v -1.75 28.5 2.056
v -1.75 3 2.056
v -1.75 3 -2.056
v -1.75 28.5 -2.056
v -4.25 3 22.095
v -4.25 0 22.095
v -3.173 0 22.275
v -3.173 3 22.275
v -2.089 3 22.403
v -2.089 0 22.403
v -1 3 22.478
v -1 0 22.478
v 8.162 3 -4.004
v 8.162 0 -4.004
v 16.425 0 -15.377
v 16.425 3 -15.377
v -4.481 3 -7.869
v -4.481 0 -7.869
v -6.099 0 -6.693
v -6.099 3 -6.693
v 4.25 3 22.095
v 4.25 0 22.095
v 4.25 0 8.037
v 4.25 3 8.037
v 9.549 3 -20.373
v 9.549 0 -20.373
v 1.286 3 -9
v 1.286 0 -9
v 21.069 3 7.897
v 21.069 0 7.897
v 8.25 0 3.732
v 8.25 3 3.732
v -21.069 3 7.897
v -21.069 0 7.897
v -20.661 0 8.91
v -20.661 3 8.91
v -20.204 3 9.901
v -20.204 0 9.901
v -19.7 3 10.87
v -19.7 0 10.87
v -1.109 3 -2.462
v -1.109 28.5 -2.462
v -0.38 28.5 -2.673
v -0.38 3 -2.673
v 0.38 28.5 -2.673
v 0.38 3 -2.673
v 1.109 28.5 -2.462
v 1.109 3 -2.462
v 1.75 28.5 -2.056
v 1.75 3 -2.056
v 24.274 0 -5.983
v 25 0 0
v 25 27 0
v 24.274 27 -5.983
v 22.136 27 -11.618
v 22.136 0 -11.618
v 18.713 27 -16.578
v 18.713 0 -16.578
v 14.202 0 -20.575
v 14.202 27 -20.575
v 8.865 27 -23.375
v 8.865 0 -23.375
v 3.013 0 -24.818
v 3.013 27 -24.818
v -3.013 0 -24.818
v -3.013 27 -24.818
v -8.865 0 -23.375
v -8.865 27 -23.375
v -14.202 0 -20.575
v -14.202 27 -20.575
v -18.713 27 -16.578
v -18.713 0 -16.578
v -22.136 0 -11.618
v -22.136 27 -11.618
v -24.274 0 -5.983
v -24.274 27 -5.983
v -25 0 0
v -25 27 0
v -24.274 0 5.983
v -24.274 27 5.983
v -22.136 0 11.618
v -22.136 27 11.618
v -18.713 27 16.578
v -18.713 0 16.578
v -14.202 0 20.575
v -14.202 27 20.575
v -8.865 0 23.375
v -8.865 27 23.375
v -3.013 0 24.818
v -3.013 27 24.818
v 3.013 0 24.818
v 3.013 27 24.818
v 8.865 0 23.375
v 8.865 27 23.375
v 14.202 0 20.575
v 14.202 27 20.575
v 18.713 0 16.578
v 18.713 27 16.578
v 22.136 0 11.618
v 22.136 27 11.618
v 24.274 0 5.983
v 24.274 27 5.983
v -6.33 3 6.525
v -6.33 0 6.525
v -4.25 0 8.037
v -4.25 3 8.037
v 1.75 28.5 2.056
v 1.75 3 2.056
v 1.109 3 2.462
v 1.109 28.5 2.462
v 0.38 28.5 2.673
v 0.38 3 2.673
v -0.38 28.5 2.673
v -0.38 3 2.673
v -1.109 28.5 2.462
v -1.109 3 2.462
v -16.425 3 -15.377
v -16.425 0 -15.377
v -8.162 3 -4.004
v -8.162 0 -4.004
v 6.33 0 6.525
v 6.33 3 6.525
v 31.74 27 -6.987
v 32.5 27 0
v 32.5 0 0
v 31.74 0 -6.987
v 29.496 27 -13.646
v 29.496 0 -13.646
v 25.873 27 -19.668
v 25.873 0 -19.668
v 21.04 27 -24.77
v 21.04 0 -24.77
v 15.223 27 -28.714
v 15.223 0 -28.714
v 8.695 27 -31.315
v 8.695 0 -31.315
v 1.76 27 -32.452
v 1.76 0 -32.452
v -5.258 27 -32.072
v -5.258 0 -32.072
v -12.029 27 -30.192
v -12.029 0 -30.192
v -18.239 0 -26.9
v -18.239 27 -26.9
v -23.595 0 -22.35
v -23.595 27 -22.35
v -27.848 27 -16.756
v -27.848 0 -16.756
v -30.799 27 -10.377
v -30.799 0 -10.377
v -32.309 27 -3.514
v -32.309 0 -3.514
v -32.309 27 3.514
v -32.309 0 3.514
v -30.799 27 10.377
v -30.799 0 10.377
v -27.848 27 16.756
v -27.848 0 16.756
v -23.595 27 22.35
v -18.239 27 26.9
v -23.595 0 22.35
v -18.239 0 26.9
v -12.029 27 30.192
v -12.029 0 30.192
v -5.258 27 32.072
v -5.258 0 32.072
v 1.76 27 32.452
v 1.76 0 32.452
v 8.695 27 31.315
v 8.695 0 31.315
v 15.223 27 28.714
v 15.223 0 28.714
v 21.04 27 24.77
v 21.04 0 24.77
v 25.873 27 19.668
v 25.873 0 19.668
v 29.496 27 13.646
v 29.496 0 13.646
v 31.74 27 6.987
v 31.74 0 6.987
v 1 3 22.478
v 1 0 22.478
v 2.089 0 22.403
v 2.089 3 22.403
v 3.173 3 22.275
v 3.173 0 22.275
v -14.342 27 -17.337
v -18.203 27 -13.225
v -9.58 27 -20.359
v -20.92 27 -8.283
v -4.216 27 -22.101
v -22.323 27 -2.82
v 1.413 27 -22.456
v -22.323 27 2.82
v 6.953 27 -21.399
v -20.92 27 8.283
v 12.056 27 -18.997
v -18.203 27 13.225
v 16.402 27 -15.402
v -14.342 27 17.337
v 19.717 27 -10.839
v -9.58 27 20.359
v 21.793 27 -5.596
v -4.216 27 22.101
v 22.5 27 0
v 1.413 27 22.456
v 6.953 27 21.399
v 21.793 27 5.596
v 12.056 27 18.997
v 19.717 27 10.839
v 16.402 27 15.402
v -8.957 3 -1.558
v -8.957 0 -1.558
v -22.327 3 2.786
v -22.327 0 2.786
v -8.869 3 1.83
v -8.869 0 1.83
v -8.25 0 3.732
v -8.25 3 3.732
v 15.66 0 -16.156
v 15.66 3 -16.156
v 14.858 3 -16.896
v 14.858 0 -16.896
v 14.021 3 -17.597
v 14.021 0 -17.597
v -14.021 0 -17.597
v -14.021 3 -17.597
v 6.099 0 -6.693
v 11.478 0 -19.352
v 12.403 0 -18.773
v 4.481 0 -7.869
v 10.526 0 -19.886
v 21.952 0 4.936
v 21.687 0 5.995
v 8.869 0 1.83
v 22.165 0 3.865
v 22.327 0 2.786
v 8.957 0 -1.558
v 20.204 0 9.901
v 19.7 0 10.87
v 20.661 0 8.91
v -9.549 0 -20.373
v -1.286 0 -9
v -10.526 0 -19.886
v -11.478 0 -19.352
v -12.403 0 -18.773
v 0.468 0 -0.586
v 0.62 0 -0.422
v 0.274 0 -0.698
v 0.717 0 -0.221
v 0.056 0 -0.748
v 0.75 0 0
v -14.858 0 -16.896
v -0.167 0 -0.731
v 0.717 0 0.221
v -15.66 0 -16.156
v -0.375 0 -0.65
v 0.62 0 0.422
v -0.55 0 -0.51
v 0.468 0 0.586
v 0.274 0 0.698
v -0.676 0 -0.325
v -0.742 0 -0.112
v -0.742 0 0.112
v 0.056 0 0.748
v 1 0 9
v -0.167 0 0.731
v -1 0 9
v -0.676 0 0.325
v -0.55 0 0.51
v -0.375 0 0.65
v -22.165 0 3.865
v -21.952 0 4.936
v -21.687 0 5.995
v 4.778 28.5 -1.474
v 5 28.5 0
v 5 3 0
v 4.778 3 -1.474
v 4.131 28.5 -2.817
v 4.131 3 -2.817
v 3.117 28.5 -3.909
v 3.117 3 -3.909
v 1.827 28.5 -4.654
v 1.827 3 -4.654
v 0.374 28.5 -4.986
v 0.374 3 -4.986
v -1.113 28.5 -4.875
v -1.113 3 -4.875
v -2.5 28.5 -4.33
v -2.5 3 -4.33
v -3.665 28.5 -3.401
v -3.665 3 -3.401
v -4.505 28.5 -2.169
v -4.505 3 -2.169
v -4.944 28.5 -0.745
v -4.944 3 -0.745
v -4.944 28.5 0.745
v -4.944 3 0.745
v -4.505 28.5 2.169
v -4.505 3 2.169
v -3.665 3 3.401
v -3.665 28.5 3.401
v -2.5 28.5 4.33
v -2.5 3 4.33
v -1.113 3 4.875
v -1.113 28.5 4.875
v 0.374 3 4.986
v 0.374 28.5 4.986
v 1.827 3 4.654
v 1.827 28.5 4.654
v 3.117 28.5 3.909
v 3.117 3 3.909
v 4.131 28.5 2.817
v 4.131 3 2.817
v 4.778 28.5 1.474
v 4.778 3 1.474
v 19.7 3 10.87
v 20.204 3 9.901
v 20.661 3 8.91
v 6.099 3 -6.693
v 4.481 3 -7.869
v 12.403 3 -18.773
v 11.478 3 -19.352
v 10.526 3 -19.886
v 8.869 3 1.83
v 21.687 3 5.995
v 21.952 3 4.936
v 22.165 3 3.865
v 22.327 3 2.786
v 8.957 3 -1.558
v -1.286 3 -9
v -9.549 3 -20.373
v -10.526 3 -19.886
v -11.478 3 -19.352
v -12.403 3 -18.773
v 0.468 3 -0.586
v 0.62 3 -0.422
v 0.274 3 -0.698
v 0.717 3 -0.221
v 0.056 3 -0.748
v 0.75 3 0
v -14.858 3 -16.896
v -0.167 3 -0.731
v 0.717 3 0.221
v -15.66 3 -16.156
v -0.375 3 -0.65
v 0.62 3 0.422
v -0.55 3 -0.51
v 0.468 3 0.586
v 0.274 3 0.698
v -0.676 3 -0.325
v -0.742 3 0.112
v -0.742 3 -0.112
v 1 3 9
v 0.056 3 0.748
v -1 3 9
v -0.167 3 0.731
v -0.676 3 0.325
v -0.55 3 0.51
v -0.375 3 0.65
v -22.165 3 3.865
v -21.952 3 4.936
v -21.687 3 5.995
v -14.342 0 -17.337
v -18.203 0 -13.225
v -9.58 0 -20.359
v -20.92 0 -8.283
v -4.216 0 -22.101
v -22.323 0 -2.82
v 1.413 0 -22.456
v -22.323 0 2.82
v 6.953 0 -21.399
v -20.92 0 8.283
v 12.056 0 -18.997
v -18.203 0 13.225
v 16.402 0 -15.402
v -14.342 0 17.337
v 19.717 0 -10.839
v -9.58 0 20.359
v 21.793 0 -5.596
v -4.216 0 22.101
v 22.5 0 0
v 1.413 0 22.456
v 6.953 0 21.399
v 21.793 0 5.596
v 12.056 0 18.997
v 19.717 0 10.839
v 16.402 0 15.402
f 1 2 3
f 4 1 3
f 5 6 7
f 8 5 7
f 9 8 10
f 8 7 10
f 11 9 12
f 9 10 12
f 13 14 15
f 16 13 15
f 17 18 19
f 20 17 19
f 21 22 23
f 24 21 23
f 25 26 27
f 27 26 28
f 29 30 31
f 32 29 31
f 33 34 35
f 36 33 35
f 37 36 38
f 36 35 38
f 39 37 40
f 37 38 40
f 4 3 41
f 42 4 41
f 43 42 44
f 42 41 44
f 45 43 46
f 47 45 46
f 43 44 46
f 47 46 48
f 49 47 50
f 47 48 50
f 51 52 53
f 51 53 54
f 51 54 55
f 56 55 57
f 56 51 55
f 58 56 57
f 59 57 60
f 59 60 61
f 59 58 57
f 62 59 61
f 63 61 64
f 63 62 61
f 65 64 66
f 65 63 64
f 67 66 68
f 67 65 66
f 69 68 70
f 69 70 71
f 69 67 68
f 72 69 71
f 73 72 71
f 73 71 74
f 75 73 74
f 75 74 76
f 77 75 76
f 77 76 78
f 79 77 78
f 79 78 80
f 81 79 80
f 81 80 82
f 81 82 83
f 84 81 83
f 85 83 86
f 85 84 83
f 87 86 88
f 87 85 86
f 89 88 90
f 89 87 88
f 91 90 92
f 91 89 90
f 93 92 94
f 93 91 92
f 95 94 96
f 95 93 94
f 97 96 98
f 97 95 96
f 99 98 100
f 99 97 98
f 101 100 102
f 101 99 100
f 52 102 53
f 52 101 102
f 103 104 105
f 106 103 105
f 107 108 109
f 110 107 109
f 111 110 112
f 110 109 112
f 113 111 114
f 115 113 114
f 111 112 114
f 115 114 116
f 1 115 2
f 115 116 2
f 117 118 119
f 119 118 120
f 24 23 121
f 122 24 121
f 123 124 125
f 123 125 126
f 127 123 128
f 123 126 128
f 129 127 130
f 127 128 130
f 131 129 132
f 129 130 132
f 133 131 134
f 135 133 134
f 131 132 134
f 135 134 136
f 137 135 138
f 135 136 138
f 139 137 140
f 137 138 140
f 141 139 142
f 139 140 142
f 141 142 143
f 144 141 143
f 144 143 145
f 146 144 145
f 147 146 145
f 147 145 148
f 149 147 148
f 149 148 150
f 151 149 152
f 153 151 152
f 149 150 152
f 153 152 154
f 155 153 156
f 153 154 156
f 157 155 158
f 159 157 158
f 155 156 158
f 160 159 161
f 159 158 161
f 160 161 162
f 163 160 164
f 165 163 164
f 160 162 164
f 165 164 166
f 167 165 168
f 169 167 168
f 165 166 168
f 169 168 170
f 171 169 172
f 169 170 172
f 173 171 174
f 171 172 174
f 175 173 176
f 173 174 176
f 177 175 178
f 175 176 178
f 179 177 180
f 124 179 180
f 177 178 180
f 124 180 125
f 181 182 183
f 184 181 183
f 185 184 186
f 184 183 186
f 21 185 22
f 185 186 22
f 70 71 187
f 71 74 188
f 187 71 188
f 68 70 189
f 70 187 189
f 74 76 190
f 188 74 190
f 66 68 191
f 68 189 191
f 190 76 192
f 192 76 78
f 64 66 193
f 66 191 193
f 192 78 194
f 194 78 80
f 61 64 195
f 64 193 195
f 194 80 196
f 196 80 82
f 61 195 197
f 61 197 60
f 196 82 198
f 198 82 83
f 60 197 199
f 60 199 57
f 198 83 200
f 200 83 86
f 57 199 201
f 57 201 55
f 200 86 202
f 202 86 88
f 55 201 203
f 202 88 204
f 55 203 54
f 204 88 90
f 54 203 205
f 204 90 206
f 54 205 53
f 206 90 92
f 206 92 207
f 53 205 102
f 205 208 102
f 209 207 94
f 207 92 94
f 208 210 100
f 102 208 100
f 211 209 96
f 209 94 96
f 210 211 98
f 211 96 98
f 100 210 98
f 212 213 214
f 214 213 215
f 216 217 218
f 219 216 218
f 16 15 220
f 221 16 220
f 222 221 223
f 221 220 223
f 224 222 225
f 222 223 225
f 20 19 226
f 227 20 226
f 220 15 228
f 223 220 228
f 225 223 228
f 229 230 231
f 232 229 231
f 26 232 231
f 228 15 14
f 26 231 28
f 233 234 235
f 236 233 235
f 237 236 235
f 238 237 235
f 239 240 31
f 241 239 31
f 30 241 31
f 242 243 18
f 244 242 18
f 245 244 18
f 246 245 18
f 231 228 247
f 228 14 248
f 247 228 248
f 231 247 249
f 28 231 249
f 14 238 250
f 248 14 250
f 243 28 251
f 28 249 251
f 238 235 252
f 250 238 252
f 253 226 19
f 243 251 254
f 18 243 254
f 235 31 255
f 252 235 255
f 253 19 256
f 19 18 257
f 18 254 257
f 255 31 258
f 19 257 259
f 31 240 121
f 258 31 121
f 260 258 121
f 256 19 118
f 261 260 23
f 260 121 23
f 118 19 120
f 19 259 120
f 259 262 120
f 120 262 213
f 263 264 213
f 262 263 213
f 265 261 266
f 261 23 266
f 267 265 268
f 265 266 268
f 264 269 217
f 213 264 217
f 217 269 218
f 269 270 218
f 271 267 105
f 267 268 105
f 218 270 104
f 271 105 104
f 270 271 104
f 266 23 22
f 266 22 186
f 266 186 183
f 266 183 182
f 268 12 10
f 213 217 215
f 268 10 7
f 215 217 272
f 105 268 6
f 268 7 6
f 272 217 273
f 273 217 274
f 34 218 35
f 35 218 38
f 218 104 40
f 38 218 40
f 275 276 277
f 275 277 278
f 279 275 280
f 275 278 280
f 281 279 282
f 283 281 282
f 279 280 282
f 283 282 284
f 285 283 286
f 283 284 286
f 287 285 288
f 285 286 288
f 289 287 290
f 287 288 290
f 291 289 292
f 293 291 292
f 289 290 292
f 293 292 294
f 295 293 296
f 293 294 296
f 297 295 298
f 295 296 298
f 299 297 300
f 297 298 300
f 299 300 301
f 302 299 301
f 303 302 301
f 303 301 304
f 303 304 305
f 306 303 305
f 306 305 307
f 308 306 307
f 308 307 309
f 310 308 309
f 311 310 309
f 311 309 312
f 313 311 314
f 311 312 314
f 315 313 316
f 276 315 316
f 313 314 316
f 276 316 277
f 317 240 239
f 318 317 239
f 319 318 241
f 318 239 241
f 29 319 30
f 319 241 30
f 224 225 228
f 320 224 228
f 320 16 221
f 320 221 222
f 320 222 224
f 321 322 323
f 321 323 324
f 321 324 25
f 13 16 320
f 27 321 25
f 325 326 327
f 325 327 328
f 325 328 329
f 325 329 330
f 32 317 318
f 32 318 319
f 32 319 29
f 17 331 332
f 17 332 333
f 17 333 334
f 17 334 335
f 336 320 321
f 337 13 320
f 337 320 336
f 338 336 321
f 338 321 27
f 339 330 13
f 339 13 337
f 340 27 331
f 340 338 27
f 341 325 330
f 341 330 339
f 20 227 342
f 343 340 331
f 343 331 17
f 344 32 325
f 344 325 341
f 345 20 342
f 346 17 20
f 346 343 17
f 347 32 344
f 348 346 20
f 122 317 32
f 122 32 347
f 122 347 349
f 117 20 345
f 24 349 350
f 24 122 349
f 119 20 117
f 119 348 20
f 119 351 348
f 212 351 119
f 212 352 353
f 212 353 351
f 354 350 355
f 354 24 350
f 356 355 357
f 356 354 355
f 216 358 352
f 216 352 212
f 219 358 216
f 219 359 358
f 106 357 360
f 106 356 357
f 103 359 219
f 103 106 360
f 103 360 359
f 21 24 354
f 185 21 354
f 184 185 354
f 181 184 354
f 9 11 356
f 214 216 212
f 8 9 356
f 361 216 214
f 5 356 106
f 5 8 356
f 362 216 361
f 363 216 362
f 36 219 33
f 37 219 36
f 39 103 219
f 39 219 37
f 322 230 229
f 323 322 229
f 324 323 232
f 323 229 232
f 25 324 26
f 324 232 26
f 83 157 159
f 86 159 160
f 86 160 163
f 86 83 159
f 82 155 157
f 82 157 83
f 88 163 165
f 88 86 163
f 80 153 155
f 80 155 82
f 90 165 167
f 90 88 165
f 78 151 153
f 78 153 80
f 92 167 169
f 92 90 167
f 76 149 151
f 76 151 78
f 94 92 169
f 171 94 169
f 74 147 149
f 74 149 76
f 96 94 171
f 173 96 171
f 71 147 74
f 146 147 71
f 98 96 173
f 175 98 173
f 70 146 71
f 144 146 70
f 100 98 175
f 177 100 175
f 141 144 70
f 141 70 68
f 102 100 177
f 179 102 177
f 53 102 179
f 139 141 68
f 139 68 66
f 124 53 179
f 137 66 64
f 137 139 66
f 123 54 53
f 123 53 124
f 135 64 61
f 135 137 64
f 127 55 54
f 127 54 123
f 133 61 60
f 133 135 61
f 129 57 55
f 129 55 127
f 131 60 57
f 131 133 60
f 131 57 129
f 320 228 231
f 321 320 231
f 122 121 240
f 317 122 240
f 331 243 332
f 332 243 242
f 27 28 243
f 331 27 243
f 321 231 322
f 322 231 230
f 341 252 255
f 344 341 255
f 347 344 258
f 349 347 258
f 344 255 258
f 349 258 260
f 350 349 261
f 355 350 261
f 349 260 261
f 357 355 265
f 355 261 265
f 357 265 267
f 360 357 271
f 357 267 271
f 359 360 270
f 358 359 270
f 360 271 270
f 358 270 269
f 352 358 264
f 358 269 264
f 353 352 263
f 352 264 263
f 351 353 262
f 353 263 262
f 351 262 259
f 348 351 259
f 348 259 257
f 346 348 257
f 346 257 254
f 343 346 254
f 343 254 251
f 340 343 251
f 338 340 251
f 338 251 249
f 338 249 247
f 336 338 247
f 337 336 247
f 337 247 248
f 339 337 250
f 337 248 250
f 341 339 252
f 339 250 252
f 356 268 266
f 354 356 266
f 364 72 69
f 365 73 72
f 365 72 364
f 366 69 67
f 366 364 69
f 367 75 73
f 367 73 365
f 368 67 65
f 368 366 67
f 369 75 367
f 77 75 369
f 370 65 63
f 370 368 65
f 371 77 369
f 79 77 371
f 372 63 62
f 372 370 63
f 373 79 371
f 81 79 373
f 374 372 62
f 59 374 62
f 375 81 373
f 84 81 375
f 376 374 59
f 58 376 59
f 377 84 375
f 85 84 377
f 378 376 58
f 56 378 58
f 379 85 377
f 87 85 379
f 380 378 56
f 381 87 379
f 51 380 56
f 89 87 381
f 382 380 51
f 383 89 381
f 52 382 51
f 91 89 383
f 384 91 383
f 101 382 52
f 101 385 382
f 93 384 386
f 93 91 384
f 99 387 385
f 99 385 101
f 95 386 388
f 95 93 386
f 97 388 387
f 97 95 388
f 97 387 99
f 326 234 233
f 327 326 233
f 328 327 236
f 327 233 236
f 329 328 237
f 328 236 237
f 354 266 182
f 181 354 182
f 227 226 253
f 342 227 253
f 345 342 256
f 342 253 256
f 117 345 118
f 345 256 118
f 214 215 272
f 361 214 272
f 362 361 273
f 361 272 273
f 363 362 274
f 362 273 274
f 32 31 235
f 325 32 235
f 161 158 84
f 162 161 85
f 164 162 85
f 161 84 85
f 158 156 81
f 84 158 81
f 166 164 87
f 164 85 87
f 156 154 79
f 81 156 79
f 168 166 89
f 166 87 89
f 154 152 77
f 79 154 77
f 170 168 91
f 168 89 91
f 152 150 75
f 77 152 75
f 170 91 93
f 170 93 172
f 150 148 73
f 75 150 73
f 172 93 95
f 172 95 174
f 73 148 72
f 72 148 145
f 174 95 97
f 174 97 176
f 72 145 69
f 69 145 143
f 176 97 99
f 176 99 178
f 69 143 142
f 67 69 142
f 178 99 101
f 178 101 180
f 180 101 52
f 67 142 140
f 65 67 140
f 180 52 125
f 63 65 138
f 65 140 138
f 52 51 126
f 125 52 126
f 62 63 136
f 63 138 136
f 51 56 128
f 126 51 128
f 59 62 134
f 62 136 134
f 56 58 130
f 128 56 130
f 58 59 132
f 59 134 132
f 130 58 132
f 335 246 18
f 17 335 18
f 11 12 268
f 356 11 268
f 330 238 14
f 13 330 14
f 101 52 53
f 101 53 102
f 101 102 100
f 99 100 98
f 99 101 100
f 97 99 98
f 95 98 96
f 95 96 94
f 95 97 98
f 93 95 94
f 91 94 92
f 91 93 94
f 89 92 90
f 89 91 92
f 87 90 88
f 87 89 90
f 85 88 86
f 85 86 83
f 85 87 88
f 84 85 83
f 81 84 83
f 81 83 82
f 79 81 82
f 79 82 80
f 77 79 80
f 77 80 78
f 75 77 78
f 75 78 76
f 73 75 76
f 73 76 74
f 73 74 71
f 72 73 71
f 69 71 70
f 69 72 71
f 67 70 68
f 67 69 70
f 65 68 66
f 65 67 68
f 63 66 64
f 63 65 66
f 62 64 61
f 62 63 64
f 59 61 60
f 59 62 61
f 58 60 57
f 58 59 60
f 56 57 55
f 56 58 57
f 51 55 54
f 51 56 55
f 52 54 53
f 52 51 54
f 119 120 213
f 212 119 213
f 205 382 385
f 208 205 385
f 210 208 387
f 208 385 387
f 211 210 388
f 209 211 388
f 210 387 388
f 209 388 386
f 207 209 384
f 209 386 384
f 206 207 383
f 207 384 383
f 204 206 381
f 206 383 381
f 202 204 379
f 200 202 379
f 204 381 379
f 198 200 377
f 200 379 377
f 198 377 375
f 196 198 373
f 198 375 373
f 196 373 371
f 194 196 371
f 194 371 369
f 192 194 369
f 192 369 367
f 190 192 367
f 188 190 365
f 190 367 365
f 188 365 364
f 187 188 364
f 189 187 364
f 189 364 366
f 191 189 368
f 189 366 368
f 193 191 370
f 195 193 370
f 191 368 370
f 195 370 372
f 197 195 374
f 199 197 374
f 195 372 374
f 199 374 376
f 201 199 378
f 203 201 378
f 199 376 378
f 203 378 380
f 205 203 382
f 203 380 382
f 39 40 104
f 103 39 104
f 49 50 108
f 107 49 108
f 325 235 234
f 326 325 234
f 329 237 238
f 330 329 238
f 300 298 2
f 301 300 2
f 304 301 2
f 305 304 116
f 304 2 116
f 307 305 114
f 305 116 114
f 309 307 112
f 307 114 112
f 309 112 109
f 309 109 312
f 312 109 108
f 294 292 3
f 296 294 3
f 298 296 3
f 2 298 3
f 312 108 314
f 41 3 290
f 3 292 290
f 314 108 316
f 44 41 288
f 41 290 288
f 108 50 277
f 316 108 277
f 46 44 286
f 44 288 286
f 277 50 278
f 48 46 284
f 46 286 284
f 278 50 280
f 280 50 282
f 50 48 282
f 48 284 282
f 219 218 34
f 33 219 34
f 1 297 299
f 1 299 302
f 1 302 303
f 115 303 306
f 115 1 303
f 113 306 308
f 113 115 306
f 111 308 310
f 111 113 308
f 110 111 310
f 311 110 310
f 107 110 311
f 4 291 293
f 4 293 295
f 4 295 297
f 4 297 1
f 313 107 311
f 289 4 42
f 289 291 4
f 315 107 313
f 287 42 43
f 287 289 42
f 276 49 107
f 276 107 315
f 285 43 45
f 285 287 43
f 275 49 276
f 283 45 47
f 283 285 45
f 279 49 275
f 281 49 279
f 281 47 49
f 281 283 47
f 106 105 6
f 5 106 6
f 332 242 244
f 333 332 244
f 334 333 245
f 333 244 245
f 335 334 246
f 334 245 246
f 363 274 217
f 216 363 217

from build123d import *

# Parameters (mm, degrees)
SKETCH1_R           = 32.5
SKETCH1_R_2         = 25
BOSS_EXTRUDE1_DEPTH = 27
SKETCH2_R           = 25
SKETCH2_R_2         = 22.5
BOSS_EXTRUDE2_DEPTH = 27
BOSS_EXTRUDE3_DEPTH = 3
SKETCH4_R           = 0.75
CUT_EXTRUDE1_DEPTH  = 3
SKETCH5_R           = 5
BOSS_EXTRUDE4_DEPTH = 25.5


with BuildPart() as part:
    # Sketch1 → Boss-Extrude1 (new body)
    with BuildSketch(Plane(origin=(0, 0, 0), x_dir=(1, 0, 0), z_dir=(0, 1, 0))):
        Circle(SKETCH1_R)
        Circle(SKETCH1_R_2, mode=Mode.SUBTRACT)
    extrude(amount=BOSS_EXTRUDE1_DEPTH)


with BuildPart() as body_2:
    # Sketch2 → Boss-Extrude2 (new body)
    with BuildSketch(Plane.XZ):
        Circle(SKETCH2_R)
        Circle(SKETCH2_R_2, mode=Mode.SUBTRACT)
    extrude(amount=-BOSS_EXTRUDE2_DEPTH)


with BuildPart() as body_3:
    # Sketch3 → Boss-Extrude3 (new body)
    with BuildSketch(Plane.XZ):
        with BuildLine():
            Line((4.25, 8.036806053), (6.330134541, 6.525499845))
            Line((6.330134541, 6.525499845), (19.70023868, 10.869710021))
            ThreePointArc((19.70023868, 10.869710021), (20.438539496, 9.408299702), (21.068609586, 7.897068451))
            Line((21.068609586, 7.897068451), (8.250491652, 3.732209466))
            Line((8.250491652, 3.732209466), (8.868525641, 1.830096433))
            Line((8.868525641, 1.830096433), (21.686643575, 5.994955418))
            ThreePointArc((21.686643575, 5.994955418), (22.065185606, 4.401997747), (22.326883133, 2.785729632))
            Line((22.326883133, 2.785729632), (8.956778993, -1.558480543))
            Line((8.956778993, -1.558480543), (8.1622383, -4.003825356))
            Line((8.1622383, -4.003825356), (16.425417091, -15.377115249))
            ThreePointArc((16.425417091, -15.377115249), (15.263680783, -16.530881675), (14.02111682, -17.597110079))
            Line((14.02111682, -17.597110079), (6.099084265, -6.693367697))
            Line((6.099084265, -6.693367697), (4.481050276, -7.868938202))
            Line((4.481050276, -7.868938202), (12.403082831, -18.772680583))
            ThreePointArc((12.403082831, -18.772680583), (11.005065978, -19.624946441), (9.548772639, -20.373289894))
            Line((9.548772639, -20.373289894), (1.285593848, -9))
            Line((1.285593848, -9), (-1.285593848, -9))
            Line((-1.285593848, -9), (-9.548772639, -20.373289894))
            ThreePointArc((-9.548772639, -20.373289894), (-11.005065978, -19.624946441), (-12.403082831, -18.772680583))
            Line((-12.403082831, -18.772680583), (-4.481050276, -7.868938202))
            Line((-4.481050276, -7.868938202), (-6.099084265, -6.693367697))
            Line((-6.099084265, -6.693367697), (-14.02111682, -17.597110079))
            ThreePointArc((-14.02111682, -17.597110079), (-15.263680783, -16.530881675), (-16.425417091, -15.377115249))
            Line((-16.425417091, -15.377115249), (-8.1622383, -4.003825356))
            Line((-8.1622383, -4.003825356), (-8.956778993, -1.558480543))
            Line((-8.956778993, -1.558480543), (-22.326883133, 2.785729632))
            ThreePointArc((-22.326883133, 2.785729632), (-22.065185606, 4.401997747), (-21.686643575, 5.994955418))
            Line((-21.686643575, 5.994955418), (-8.868525641, 1.830096433))
            Line((-8.868525641, 1.830096433), (-8.250491652, 3.732209466))
            Line((-8.250491652, 3.732209466), (-21.068609586, 7.897068451))
            ThreePointArc((-21.068609586, 7.897068451), (-20.438539496, 9.408299702), (-19.70023868, 10.869710021))
            Line((-19.70023868, 10.869710021), (-6.330134541, 6.525499845))
            Line((-6.330134541, 6.525499845), (-4.25, 8.036806053))
            Line((-4.25, 8.036806053), (-4.25, 22.09496549))
            ThreePointArc((-4.25, 22.09496549), (-2.631968695, 22.345530667), (-1, 22.477766793))
            Line((-1, 22.477766793), (-1, 9))
            Line((-1, 9), (1, 9))
            Line((1, 9), (1, 22.477766793))
            ThreePointArc((1, 22.477766793), (2.631968695, 22.345530667), (4.25, 22.09496549))
            Line((4.25, 22.09496549), (4.25, 8.036806053))
        make_face()
    extrude(amount=-BOSS_EXTRUDE3_DEPTH)

    # Sketch4 → Cut-Extrude1 (cut)
    with BuildSketch(Plane.XZ):
        Circle(SKETCH4_R)
    extrude(amount=-CUT_EXTRUDE1_DEPTH, mode=Mode.SUBTRACT)


with BuildPart() as body_4:
    # Sketch5 → Boss-Extrude4 (new body)
    with BuildSketch(Plane(origin=(0, 3, 0), x_dir=(1, 0, 0), z_dir=(0, 1, 0))):
        Circle(SKETCH5_R)
        with BuildLine():
            Line((1.75, 2.056088519), (1.75, -2.056088519))
            ThreePointArc((1.75, -2.056088519), (0, -2.7), (-1.75, -2.056088519))
            Line((-1.75, -2.056088519), (-1.75, 2.056088519))
            ThreePointArc((-1.75, 2.056088519), (0, 2.7), (1.75, 2.056088519))
        make_face(mode=Mode.SUBTRACT)
    extrude(amount=BOSS_EXTRUDE4_DEPTH)


solid = Compound([part.part, body_2.part, body_3.part, body_4.part])
